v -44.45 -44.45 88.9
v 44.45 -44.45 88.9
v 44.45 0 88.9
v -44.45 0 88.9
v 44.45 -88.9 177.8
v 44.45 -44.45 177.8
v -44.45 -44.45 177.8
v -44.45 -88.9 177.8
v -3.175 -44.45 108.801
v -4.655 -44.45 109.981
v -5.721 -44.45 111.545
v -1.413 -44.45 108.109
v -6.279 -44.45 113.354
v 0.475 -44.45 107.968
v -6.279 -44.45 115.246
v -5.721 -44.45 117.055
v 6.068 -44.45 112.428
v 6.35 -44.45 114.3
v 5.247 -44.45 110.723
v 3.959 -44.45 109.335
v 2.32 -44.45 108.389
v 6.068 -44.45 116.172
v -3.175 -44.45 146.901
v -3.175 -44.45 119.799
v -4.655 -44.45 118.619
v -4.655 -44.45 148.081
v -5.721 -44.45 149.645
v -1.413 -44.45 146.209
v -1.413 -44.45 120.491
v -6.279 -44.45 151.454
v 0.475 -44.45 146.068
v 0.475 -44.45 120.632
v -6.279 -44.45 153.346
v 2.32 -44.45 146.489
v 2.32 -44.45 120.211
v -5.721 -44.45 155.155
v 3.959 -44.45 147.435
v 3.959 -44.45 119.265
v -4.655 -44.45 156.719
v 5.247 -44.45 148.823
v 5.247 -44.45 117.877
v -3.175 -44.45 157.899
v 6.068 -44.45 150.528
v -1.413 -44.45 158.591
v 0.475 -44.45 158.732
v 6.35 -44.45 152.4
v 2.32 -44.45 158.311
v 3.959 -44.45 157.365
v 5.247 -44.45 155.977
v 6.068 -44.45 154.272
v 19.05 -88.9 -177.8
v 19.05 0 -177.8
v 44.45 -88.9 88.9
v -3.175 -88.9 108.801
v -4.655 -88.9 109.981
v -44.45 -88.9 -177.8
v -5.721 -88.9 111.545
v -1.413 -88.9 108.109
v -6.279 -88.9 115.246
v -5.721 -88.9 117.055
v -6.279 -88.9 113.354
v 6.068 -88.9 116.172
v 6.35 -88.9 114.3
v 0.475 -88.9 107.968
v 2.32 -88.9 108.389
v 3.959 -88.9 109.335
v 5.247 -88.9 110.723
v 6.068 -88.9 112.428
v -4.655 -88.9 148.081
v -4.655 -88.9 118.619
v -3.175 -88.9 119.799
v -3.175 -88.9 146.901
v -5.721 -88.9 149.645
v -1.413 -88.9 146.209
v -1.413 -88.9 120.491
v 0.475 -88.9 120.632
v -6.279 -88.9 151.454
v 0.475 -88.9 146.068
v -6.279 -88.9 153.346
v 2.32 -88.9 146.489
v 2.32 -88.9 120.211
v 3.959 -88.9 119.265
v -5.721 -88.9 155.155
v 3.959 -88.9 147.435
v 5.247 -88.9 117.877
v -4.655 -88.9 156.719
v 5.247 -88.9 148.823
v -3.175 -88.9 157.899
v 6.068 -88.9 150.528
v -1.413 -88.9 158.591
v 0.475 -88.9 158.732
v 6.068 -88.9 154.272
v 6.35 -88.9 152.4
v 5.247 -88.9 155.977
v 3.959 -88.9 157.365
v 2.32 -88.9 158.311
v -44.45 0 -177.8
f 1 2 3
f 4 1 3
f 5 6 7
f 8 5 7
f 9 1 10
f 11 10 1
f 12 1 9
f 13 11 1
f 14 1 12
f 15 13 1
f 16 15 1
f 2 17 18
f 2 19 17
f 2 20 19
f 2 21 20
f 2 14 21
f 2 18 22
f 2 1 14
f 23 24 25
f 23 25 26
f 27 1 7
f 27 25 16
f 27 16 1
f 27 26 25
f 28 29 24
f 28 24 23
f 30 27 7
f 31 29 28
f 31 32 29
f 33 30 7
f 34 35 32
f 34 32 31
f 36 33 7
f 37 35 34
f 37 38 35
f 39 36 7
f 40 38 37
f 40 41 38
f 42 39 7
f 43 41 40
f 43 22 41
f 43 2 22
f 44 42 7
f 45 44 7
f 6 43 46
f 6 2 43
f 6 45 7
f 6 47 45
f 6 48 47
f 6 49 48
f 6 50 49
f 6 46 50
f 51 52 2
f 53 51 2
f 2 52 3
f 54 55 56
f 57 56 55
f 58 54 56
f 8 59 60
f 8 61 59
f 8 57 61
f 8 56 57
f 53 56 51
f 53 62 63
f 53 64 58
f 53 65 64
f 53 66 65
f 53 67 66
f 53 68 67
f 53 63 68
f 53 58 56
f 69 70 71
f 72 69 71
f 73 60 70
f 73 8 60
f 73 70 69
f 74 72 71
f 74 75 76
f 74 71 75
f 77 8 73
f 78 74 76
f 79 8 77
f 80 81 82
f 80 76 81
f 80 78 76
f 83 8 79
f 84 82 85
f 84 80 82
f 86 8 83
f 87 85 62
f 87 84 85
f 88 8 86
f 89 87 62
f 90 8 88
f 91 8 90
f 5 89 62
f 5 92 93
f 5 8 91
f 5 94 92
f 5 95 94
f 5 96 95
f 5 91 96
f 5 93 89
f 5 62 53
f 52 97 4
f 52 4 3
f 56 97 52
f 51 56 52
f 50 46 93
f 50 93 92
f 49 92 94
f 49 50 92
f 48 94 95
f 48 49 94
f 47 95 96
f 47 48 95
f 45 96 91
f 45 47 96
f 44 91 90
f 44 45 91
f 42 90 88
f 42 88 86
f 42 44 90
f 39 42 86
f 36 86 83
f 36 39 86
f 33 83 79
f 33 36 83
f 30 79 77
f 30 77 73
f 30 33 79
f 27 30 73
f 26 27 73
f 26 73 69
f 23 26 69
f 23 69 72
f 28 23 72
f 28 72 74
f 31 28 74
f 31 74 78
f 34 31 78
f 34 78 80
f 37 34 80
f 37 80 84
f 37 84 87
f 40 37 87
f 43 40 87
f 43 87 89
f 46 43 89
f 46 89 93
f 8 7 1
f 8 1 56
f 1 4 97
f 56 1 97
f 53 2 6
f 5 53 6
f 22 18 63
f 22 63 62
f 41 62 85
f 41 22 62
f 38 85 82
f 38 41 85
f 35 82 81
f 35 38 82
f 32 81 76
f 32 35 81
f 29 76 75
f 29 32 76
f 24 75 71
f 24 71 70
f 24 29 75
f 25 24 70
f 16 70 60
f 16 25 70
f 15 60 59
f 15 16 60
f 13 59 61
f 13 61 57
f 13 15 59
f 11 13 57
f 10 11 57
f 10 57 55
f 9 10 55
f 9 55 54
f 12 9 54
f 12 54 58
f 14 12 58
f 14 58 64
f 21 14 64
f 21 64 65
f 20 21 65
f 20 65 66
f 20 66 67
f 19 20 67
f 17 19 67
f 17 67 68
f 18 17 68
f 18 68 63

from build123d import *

# Parameters (mm, degrees)
F0_R     = 6.35
F1_DEPTH = 88.9
F2_W     = 44.45
F2_H     = 88.9
F3_DEPTH = 101.6


with BuildPart() as f1:
    # F0 (on Front) → F1 (new body)
    with BuildSketch(Plane.XZ):
        Polygon((44.45, 88.9), (44.45, 177.8), (-44.45, 177.8), (-44.45, -177.8), (19.05, -177.8), align=None)
        with Locations((0, 114.3)):
            Circle(F0_R, mode=Mode.SUBTRACT)
        with Locations((0, 152.4)):
            Circle(F0_R, mode=Mode.SUBTRACT)
    extrude(amount=F1_DEPTH)

    # F2 (on face) → F3 (cut)
    with BuildSketch(Plane.YZ.offset(44.45)):
        with Locations((-22.225, 133.35)):
            Rectangle(F2_W, F2_H)
    extrude(amount=-F3_DEPTH, mode=Mode.SUBTRACT)


solid = f1.part
